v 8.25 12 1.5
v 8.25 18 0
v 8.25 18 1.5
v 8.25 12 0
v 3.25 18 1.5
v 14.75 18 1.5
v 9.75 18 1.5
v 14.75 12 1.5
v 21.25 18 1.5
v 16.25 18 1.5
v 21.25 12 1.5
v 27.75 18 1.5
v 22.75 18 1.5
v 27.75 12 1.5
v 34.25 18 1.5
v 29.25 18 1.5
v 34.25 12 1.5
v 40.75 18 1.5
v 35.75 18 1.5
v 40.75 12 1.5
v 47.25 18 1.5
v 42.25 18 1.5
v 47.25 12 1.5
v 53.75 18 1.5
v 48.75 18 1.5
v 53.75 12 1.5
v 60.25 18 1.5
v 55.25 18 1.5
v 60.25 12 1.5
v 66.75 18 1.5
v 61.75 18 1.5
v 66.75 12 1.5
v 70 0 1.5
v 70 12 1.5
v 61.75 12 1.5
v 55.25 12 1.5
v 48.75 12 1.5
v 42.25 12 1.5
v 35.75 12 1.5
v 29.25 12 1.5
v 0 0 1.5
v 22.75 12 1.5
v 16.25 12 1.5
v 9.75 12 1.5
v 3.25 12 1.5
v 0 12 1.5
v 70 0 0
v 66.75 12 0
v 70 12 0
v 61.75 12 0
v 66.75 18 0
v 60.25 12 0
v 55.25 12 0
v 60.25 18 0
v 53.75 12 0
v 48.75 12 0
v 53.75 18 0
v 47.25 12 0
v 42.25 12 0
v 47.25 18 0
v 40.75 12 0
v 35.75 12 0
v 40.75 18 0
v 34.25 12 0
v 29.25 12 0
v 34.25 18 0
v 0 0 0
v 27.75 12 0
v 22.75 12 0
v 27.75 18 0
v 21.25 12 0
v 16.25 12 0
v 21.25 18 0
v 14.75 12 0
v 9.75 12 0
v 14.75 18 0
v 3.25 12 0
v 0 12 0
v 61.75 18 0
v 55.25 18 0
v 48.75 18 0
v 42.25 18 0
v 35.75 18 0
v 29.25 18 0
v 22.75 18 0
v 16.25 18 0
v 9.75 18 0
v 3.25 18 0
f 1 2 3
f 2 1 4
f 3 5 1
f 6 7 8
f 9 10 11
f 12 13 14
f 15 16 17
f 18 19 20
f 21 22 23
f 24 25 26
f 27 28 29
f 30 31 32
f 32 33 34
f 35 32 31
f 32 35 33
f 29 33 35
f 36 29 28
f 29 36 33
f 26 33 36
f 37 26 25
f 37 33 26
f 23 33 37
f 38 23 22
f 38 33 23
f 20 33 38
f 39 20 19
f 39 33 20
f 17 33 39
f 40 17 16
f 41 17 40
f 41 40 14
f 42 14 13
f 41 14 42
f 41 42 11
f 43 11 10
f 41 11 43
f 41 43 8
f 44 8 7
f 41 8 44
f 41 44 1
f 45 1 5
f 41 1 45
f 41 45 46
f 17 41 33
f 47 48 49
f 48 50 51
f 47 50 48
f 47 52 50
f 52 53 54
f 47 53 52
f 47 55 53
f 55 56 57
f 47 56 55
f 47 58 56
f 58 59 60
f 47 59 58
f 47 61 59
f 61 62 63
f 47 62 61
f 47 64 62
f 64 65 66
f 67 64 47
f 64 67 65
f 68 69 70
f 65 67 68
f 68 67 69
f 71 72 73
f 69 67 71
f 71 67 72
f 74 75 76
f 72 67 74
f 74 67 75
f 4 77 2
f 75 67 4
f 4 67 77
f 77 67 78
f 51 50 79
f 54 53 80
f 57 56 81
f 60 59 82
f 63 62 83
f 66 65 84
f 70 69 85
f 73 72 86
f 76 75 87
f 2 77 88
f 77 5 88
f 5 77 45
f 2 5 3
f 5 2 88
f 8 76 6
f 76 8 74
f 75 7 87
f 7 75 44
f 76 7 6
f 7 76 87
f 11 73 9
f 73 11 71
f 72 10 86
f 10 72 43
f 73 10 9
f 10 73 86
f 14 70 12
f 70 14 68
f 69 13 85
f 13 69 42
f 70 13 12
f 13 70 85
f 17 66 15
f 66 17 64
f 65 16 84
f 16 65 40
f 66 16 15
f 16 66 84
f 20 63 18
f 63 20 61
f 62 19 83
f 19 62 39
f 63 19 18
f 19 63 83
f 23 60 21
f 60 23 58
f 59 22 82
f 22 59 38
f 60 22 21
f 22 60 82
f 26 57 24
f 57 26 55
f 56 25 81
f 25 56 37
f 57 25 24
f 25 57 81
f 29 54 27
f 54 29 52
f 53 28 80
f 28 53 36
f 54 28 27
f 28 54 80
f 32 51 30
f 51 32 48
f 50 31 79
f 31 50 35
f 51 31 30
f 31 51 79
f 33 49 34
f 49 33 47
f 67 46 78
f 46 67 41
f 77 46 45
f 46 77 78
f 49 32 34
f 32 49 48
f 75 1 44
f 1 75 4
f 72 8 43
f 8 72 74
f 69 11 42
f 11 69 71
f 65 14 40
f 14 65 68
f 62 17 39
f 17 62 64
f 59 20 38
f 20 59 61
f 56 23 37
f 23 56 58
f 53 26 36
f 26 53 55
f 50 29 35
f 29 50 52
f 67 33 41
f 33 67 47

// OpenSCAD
$fn = 64;

// Dimensions
SPINE_LENGTH_X = 70;
SPINE_WIDTH_Y = 12;
SPINE_THICK_Z = 1.5;

TOOTH_COUNT = 10;
TOOTH_WIDTH_X = 5.0;
TOOTH_LENGTH_Y = 12;
TOOTH_THICK_Z = 1.5;

GAP_X = 1.5;

// Spine is centered at origin (0,0,0)
// Spine Y range: -6 to +6
// Spine Z range: 0 to 1.5

// Teeth hang from Y=6 edge in -Y direction
// Tooth Y range: 6 to -6 (matches spine width)
// Tooth X range: centered on spine

// Calculate tooth row centering
// Total tooth row length = 10 * 5.0 + 9 * 1.5 = 50 + 13.5 = 63.5 mm
// Center offset from spine edge = (70 - 63.5) / 2 = 3.25 mm

// Tooth positions in X
// Start X = 3.25
// Step X = 5.0 + 1.5 = 6.5

// Tooth positions in Y
// Hang from Y=6 edge in -Y direction
// Tooth Y range: 6 to -6
// Tooth center Y = 0

union() {
    // Spine
    translate([0, 0, 0])
    cube([SPINE_LENGTH_X, SPINE_WIDTH_Y, SPINE_THICK_Z]);

    // Teeth
    for (i = [0 : TOOTH_COUNT - 1]) {
        // Calculate X position for this tooth
        x_center = (SPINE_LENGTH_X - (TOOTH_COUNT * TOOTH_WIDTH_X + (TOOTH_COUNT - 1) * GAP_X)) / 2;
        x_pos = x_center + i * (TOOTH_WIDTH_X + GAP_X);

        // Translate to position
        translate([x_pos, 6, 0])
        // Tooth hangs from spine in -Y direction
        // Tooth Y range: 6 to -6
        // Tooth X range: -2.5 to +2.5 (width 5)
        // Tooth Z range: 0 to 1.5
        cube([TOOTH_WIDTH_X, TOOTH_LENGTH_Y, TOOTH_THICK_Z]);
    }
}
